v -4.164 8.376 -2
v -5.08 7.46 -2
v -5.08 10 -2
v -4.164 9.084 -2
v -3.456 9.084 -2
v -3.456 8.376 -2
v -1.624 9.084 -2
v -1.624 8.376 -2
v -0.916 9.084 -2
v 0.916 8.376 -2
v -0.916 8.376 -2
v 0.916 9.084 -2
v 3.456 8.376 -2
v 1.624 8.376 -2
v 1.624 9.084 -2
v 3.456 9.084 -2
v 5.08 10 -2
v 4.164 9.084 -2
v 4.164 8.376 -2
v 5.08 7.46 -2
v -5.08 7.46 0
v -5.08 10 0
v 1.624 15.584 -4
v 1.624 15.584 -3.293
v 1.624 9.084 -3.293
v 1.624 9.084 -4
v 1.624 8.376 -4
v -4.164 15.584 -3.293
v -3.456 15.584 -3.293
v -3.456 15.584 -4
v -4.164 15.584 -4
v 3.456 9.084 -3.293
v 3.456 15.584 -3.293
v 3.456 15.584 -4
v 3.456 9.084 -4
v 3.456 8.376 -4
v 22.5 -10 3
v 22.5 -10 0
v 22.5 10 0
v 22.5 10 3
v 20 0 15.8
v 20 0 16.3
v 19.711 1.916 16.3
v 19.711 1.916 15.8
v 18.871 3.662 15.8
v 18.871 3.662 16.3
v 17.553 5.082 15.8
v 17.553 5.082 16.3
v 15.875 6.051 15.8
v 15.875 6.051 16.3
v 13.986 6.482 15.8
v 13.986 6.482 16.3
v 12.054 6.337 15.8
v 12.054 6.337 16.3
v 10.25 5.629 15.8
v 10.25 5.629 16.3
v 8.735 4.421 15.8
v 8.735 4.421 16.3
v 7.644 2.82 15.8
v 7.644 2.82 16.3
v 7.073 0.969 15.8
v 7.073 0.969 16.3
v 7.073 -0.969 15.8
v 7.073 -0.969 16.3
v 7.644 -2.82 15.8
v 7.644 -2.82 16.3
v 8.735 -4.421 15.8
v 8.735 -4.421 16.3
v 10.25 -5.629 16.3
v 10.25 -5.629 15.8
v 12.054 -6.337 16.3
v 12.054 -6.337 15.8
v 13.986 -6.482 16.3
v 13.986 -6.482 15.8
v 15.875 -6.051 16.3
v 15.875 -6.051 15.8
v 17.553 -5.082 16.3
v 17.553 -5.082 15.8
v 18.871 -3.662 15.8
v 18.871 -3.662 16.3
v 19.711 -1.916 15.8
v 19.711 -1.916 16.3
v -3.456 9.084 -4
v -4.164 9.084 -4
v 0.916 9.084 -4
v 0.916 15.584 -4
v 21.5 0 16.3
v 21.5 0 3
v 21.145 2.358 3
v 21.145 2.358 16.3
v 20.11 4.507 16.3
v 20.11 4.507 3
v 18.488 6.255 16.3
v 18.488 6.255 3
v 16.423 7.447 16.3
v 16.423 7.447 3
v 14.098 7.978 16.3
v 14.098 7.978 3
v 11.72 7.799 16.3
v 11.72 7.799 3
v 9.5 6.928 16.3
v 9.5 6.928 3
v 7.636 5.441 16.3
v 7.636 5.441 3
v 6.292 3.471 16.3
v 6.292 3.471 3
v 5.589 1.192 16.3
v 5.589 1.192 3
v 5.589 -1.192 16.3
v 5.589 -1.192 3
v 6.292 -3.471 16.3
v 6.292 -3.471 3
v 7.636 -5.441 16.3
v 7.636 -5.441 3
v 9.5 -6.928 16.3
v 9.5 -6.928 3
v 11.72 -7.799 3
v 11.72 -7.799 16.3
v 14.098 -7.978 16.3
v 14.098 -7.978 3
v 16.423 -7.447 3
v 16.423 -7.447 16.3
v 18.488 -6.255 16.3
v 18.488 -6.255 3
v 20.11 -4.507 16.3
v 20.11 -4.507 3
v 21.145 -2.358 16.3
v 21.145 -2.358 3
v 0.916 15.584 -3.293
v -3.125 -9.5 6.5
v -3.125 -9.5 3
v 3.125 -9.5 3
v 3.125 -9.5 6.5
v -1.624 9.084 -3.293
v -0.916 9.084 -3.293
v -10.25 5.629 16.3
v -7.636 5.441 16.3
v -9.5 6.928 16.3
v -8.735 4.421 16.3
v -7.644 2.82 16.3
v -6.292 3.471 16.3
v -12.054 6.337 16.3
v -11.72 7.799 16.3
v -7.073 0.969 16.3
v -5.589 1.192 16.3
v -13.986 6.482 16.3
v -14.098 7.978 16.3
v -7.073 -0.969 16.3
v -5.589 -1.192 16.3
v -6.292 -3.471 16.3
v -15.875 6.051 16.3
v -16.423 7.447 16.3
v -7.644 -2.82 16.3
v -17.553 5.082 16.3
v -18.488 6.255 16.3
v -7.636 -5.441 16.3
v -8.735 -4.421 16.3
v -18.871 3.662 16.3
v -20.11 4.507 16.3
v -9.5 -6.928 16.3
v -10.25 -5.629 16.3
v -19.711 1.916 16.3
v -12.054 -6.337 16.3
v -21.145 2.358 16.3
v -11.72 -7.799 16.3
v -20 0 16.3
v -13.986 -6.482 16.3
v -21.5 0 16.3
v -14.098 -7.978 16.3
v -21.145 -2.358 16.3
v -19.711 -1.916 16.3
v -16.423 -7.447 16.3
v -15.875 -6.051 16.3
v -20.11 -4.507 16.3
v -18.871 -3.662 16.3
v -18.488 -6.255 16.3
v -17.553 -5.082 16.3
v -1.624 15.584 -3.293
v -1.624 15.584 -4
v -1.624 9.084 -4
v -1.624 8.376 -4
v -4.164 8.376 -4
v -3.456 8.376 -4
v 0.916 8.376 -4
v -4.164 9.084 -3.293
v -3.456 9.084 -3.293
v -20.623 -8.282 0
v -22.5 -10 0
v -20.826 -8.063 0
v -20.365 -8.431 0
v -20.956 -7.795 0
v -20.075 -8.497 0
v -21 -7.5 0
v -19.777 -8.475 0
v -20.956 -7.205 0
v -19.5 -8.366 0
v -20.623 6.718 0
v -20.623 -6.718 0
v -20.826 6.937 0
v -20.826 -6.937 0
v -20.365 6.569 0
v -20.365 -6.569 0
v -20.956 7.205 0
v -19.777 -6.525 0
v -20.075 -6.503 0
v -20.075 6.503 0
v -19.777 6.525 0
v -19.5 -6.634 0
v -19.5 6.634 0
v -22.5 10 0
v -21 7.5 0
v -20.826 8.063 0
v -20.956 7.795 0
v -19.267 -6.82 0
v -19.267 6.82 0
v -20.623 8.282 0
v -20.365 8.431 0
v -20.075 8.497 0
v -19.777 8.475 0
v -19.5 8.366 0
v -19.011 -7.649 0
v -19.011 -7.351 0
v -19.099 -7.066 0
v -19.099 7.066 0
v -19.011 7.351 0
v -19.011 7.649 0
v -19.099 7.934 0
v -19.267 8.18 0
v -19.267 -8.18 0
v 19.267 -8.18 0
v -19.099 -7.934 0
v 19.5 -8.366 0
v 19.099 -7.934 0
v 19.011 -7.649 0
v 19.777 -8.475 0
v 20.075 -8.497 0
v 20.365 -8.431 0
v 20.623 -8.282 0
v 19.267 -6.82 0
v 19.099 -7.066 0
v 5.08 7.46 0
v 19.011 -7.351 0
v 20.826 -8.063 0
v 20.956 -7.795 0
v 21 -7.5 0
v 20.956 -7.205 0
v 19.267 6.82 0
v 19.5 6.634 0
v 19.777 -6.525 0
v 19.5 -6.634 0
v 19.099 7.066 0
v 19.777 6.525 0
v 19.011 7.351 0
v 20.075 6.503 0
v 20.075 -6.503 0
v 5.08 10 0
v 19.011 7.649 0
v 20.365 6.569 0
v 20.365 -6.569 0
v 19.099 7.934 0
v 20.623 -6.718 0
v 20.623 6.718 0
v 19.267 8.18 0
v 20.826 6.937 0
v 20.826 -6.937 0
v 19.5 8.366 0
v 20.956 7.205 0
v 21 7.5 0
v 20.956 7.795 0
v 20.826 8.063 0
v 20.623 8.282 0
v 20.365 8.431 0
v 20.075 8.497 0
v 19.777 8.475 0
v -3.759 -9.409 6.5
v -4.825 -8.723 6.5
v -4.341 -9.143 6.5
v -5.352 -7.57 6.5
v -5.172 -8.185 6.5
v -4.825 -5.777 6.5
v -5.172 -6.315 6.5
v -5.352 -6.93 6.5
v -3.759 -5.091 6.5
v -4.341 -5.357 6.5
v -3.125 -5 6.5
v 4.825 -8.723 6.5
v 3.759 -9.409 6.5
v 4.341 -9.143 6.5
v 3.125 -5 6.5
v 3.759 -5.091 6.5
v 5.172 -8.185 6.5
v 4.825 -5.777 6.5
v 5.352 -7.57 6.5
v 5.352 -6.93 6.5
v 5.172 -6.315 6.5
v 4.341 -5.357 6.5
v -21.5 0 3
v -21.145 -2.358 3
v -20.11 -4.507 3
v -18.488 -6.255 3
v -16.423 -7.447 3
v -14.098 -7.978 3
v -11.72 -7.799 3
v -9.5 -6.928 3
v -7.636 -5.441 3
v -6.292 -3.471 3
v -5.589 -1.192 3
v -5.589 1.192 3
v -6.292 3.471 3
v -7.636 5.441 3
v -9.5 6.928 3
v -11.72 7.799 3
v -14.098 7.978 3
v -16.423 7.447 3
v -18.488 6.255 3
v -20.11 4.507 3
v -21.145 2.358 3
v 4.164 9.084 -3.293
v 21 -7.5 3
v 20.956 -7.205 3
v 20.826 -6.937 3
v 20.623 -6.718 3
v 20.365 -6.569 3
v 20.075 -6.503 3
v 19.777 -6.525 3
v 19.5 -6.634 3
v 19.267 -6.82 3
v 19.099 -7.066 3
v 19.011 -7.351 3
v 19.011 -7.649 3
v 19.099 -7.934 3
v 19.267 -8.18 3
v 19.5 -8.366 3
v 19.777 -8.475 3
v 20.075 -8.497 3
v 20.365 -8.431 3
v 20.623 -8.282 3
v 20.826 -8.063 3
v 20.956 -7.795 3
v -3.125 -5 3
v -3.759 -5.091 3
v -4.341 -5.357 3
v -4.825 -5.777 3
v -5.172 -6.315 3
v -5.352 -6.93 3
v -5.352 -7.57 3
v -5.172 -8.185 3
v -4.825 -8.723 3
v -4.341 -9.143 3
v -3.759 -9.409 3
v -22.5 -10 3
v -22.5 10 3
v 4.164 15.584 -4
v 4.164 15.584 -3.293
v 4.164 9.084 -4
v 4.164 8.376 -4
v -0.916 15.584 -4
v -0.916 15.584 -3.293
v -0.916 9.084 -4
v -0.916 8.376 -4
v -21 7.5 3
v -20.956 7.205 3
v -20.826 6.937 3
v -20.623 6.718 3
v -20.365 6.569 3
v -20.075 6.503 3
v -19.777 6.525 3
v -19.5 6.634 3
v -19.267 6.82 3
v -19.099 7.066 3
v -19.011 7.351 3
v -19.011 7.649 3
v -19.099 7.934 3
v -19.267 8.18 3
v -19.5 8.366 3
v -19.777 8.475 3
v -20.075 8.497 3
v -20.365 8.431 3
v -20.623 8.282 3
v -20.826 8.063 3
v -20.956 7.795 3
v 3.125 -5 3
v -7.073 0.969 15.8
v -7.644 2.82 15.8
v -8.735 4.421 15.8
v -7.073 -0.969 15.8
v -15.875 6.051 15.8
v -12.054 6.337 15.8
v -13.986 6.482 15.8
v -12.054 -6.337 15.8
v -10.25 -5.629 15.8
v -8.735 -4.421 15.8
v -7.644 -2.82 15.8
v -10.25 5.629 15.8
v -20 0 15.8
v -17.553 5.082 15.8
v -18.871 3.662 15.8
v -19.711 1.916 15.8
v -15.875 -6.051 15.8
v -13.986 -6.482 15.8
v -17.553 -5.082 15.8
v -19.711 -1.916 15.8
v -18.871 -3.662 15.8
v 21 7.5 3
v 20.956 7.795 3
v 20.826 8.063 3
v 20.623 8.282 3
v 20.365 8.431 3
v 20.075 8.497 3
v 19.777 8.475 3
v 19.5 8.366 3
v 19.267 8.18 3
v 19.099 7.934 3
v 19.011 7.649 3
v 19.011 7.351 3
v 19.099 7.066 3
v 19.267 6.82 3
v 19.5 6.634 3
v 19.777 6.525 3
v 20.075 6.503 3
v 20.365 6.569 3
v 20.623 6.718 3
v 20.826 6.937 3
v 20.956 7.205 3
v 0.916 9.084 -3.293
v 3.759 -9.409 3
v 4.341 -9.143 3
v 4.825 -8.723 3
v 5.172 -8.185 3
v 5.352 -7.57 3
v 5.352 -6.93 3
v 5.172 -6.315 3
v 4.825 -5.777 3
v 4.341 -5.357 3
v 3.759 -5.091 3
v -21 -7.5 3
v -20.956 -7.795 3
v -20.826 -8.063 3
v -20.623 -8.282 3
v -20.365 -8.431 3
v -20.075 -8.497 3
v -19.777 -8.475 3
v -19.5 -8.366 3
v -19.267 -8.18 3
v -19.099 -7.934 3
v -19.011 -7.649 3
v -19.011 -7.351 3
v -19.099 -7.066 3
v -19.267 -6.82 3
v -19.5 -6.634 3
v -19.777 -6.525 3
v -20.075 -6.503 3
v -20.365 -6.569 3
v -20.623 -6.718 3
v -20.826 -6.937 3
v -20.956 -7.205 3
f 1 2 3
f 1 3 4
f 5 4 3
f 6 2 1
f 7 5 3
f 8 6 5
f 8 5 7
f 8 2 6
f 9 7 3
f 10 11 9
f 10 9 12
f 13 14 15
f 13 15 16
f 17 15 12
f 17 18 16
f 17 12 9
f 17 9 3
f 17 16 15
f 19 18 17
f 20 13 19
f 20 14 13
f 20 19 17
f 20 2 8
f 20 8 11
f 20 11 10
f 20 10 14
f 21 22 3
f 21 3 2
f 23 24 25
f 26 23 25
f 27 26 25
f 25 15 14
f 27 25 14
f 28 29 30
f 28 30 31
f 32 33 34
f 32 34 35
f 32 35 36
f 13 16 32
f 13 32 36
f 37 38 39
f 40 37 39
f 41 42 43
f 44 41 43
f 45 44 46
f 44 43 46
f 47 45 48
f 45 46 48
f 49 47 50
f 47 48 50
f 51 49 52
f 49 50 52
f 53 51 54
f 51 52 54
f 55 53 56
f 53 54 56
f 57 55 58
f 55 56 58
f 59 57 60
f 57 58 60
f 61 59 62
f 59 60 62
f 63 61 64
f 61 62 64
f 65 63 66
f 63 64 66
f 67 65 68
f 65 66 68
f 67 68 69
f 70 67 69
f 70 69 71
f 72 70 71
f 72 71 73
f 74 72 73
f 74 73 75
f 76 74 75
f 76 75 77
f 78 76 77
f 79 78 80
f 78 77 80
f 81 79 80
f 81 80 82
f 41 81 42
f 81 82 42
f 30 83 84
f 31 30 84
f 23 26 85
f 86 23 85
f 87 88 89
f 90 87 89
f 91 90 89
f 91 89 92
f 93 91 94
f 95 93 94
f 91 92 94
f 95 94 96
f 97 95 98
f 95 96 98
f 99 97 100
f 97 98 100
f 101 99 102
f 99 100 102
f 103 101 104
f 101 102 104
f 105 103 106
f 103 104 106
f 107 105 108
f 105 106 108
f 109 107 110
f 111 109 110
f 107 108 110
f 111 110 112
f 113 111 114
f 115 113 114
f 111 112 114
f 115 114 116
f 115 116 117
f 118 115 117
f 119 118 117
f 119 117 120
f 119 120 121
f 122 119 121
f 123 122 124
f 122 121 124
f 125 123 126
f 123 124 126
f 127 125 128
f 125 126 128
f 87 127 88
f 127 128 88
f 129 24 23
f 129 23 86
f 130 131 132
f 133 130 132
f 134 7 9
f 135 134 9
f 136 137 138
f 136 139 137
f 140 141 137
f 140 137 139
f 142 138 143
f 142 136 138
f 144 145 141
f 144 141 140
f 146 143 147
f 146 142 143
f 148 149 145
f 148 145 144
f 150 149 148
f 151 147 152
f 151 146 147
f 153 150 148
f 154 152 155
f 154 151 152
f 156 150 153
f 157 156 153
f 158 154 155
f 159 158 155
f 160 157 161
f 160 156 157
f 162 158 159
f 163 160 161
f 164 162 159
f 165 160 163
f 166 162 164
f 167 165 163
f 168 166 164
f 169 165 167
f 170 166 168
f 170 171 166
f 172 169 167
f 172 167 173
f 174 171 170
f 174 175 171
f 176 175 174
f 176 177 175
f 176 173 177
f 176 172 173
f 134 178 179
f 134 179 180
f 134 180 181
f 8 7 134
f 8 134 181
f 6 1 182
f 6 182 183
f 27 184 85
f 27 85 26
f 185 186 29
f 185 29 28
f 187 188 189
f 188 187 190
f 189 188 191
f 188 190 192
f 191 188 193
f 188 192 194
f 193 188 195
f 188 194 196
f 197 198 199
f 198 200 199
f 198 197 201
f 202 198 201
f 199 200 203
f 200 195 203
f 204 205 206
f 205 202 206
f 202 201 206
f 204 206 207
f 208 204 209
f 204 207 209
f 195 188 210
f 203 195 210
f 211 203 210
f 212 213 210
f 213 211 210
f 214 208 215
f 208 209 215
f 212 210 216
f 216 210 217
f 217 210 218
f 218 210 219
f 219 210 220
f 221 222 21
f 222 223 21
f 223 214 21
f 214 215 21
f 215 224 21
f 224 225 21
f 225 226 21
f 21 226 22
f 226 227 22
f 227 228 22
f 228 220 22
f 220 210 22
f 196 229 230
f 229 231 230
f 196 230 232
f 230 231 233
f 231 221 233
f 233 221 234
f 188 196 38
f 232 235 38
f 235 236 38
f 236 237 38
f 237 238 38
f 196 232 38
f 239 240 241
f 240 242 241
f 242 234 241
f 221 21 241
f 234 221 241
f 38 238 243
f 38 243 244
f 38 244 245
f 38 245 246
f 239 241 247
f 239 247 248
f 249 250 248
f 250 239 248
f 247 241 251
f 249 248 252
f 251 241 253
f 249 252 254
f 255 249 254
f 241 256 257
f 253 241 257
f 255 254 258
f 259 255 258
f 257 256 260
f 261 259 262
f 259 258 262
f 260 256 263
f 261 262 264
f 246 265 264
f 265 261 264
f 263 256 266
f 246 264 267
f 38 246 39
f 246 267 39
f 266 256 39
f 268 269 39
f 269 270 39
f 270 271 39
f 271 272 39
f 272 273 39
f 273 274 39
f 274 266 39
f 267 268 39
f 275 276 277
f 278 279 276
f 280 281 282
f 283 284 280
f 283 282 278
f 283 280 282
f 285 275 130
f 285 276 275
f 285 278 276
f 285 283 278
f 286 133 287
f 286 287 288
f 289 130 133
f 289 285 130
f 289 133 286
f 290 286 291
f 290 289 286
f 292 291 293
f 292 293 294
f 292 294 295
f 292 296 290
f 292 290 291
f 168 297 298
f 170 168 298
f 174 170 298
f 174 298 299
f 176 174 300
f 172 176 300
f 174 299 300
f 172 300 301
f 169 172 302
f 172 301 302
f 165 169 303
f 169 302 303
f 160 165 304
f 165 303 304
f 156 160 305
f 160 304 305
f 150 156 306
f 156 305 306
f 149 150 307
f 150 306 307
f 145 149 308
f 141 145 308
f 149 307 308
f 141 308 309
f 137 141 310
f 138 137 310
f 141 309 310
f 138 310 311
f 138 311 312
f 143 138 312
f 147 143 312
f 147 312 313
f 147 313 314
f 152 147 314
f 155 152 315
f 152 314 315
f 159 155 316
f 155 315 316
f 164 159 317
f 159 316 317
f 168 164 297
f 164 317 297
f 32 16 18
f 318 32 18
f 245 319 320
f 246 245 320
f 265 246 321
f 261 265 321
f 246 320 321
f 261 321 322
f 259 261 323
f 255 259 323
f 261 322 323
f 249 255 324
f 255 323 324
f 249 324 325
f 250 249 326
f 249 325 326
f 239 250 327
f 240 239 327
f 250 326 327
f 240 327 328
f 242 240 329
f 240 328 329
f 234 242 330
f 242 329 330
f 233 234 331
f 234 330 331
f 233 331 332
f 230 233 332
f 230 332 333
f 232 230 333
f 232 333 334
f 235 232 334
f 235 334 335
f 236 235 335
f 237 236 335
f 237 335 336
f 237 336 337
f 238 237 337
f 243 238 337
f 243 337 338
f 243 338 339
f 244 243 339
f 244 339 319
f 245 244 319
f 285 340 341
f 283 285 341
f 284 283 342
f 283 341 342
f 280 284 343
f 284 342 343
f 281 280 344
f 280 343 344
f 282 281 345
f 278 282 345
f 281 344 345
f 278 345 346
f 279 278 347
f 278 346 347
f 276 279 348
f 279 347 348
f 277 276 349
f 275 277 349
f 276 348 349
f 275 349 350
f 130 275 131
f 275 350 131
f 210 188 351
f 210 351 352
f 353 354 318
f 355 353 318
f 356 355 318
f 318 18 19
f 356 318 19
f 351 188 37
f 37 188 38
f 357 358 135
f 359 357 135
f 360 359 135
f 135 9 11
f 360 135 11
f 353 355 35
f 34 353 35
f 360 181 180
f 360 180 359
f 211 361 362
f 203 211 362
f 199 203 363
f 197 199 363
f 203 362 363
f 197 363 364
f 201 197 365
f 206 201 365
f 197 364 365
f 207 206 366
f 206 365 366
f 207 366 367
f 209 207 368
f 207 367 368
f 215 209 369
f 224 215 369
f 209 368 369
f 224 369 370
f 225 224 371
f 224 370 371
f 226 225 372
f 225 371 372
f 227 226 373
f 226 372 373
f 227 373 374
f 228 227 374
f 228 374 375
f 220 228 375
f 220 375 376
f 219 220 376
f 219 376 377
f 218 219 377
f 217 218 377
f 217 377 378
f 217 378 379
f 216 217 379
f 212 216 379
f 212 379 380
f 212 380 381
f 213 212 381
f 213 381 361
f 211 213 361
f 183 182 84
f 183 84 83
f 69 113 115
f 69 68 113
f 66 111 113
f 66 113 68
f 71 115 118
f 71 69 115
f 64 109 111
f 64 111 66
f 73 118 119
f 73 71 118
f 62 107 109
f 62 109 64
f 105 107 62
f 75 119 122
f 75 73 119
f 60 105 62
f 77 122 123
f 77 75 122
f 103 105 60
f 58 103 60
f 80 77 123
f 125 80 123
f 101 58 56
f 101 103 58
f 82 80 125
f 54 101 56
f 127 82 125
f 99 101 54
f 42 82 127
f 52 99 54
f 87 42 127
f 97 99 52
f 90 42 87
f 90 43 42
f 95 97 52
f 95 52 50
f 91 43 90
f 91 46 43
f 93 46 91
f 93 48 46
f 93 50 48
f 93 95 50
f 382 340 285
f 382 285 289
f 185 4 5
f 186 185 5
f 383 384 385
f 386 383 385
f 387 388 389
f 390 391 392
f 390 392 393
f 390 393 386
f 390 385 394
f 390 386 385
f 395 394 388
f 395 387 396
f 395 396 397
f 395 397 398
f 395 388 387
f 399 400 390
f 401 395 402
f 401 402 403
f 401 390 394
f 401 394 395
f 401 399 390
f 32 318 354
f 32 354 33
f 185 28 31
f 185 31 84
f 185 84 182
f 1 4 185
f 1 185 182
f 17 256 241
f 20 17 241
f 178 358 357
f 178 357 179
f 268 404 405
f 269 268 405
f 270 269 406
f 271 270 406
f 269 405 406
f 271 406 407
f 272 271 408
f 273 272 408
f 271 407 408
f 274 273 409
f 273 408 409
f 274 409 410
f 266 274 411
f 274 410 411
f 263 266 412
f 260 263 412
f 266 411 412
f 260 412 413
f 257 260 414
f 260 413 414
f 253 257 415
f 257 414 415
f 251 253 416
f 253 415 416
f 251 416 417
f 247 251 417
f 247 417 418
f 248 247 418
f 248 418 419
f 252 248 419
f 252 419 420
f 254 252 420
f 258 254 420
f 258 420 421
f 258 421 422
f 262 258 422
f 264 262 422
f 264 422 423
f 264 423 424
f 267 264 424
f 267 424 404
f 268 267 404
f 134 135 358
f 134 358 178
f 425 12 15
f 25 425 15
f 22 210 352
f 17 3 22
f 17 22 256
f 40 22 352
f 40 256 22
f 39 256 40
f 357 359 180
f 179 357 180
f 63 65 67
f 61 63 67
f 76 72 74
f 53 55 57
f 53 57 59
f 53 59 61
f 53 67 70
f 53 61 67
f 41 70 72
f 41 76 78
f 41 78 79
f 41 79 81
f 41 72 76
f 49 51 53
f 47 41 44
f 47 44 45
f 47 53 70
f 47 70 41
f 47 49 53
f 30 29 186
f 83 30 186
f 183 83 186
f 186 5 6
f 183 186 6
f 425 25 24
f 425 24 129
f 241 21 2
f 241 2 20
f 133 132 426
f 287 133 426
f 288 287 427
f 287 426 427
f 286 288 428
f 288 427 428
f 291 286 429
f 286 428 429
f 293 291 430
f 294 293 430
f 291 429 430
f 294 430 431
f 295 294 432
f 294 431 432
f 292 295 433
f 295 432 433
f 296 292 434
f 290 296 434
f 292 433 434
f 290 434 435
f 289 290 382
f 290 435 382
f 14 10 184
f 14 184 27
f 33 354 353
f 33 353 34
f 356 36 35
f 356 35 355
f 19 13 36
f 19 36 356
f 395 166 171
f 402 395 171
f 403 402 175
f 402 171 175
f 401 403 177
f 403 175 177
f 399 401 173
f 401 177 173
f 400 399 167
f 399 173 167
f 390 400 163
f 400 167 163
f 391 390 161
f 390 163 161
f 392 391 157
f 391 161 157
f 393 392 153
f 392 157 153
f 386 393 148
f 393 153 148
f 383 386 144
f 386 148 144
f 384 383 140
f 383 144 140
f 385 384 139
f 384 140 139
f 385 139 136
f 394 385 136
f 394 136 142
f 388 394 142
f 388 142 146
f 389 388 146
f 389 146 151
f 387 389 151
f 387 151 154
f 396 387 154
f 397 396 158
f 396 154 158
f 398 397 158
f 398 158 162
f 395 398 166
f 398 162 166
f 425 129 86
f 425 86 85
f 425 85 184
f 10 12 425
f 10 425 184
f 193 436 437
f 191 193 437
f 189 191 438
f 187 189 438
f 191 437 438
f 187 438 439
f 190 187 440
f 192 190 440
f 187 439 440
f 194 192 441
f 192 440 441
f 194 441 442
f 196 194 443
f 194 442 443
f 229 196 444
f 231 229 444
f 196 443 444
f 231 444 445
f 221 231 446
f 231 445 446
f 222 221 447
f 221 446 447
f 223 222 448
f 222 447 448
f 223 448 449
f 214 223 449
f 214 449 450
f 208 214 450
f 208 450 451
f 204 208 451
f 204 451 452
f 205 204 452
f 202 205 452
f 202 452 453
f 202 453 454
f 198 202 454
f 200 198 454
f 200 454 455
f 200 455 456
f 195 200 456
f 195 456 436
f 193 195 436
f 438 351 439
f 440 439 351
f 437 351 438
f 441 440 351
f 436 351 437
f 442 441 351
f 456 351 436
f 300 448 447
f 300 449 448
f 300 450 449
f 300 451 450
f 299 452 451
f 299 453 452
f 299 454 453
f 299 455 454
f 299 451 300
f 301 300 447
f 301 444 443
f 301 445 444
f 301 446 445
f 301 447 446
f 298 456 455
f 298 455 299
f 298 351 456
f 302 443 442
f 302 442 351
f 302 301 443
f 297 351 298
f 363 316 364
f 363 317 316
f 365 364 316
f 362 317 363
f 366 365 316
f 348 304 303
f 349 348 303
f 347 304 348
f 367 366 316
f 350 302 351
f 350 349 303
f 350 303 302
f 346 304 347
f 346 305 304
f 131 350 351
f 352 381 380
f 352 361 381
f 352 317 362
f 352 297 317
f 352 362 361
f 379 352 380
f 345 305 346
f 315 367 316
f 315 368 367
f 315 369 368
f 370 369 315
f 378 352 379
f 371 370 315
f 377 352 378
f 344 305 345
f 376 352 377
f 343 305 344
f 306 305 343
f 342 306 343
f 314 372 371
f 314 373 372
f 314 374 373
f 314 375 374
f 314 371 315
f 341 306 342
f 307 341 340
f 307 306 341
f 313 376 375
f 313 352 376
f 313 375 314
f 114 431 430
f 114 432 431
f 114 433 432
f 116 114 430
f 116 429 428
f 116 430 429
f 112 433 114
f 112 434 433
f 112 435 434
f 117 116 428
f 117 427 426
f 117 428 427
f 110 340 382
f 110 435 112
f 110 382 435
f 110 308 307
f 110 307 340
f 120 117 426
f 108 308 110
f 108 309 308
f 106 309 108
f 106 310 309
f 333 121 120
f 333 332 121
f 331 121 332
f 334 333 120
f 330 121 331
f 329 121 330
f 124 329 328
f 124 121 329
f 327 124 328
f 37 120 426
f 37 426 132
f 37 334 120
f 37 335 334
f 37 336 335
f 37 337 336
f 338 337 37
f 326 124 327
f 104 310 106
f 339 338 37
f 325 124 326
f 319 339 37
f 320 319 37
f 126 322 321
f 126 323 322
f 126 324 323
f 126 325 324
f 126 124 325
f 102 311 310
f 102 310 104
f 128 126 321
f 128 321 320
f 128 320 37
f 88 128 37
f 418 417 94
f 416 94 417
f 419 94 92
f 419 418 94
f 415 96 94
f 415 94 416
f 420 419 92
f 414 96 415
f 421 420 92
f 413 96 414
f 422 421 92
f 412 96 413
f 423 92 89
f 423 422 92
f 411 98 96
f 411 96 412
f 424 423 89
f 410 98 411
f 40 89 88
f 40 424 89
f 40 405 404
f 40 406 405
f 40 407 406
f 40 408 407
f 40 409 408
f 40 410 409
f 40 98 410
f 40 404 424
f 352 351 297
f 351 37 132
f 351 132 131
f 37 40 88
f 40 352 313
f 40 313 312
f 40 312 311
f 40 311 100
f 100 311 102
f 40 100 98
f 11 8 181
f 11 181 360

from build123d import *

# Parameters (mm, degrees)
SKETCH_W               = 45
SKETCH_H               = 20
PAD_DEPTH              = 3
SKETCH001_R            = 1
POCKET_DEPTH           = 5
POLARPATTERN_COUNT     = 2
SKETCH002_R            = 8
PAD001_DEPTH           = 13.3
POLARPATTERN001_COUNT  = 2
PAD002_DEPTH           = 3.5
SKETCH006_W            = 10.16
SKETCH006_H            = 2.54
PAD003_DEPTH           = 2
SKETCH007_W            = 0.707106
SKETCH007_H            = 0.707106
PAD004_DEPTH           = 2
LINEARPATTERN_COUNT    = 4
LINEARPATTERN_PITCH    = 2.54
SKETCH008_W            = 0.707106
SKETCH008_H            = 0.707107
PAD005_DEPTH           = 6.5
LINEARPATTERN001_COUNT = 4
LINEARPATTERN001_PITCH = 2.54
SKETCH009_R            = 1
POCKET001_DEPTH        = 5
POLARPATTERN002_COUNT  = 2
SKETCH010_R            = 6.5
POCKET002_DEPTH        = 0.5
POLARPATTERN003_COUNT  = 2


with BuildPart() as part:
    # Sketch → Pad (new body)
    with BuildSketch(Plane.XY):
        Rectangle(SKETCH_W, SKETCH_H)
    extrude(amount=PAD_DEPTH)

    # Sketch001 (on Face6 of Pad) → Pocket (cut)
    with BuildSketch(Plane.XY.offset(3)):
        with Locations((20, 7.5)):
            Circle(SKETCH001_R)
    pocket = extrude(amount=-POCKET_DEPTH, mode=Mode.SUBTRACT)

    # PolarPattern: Pocket ×2 about axis
    polarpattern_axis = Axis((0, 0, 3), (0, 0, 1))
    for i in range(1, POLARPATTERN_COUNT):
        add(pocket.rotate(polarpattern_axis, i * 360 / POLARPATTERN_COUNT), mode=Mode.SUBTRACT)

    # Sketch002 (on Face5 of PolarPattern) → Pad001 (join)
    with BuildSketch(Plane.XY.offset(3)):
        with Locations((13.5, 0)):
            Circle(SKETCH002_R)
    pad001 = extrude(amount=PAD001_DEPTH)

    # PolarPattern001: Pad001 ×2 about axis
    polarpattern001_axis = Axis((0, 0, 3), (0, 0, 1))
    for i in range(1, POLARPATTERN001_COUNT):
        add(pad001.rotate(polarpattern001_axis, i * 360 / POLARPATTERN001_COUNT))

    # Sketch003 (on Face5 of PolarPattern001) → Pad002 (join)
    with BuildSketch(Plane.XY.offset(3)):
        with BuildLine():
            ThreePointArc((-3.125, -5), (-5.375, -7.25), (-3.125, -9.5))
            Line((-3.125, -9.5), (3.125, -9.5))
            ThreePointArc((3.125, -9.5), (5.375, -7.25), (3.125, -5))
            Line((-3.125, -5), (3.125, -5))
        make_face()
    extrude(amount=PAD002_DEPTH)

    # Sketch006 (on Face4 of Pad002) → Pad003 (join)
    with BuildSketch(Plane(origin=(0, 0, 0), x_dir=(1, 0, 0), z_dir=(0, 0, -1))):
        with Locations((0, -8.73)):
            Rectangle(SKETCH006_W, SKETCH006_H)
    extrude(amount=PAD003_DEPTH)

    # Sketch007 (on Face13 of Pad003) → Pad004 (join)
    with BuildSketch(Plane(origin=(0, 0, -2), x_dir=(1, 0, 0), z_dir=(0, 0, -1))):
        with Locations((-3.81, -8.73)):
            Rectangle(SKETCH007_W, SKETCH007_H)
    pad004 = extrude(amount=PAD004_DEPTH)

    # LinearPattern: Pad004 ×4
    with Locations(*[(i * LINEARPATTERN_PITCH, 0, 0) for i in range(1, LINEARPATTERN_COUNT)]):
        add(pad004)

    # Sketch008 (on Face31 of LinearPattern) → Pad005 (join)
    with BuildSketch(Plane(origin=(0, 9.083553, 0), x_dir=(-1, 0, 0), z_dir=(0, 1, 0))):
        with Locations((-3.81, -3.646443)):
            Rectangle(SKETCH008_W, SKETCH008_H)
    pad005 = extrude(amount=PAD005_DEPTH)

    # LinearPattern001: Pad005 ×4
    with Locations(*[(-i * LINEARPATTERN001_PITCH, 0, 0) for i in range(1, LINEARPATTERN001_COUNT)]):
        add(pad005)

    # Sketch009 → Pocket001 (cut)
    with BuildSketch(Plane.XY.offset(3)):
        with Locations((20, -7.5)):
            Circle(SKETCH009_R)
    pocket001 = extrude(amount=-POCKET001_DEPTH, mode=Mode.SUBTRACT)

    # PolarPattern002: Pocket001 ×2 about axis
    polarpattern002_axis = Axis((0, 0, 3), (0, 0, 1))
    for i in range(1, POLARPATTERN002_COUNT):
        add(pocket001.rotate(polarpattern002_axis, i * 360 / POLARPATTERN002_COUNT), mode=Mode.SUBTRACT)

    # Sketch010 (on Face76 of PolarPattern002) → Pocket002 (cut)
    with BuildSketch(Plane.XY.offset(16.3)):
        with Locations((13.5, 0)):
            Circle(SKETCH010_R)
    pocket002 = extrude(amount=-POCKET002_DEPTH, mode=Mode.SUBTRACT)

    # PolarPattern003: Pocket002 ×2 about axis
    polarpattern003_axis = Axis((0, 0, 16.3), (0, 0, 1))
    for i in range(1, POLARPATTERN003_COUNT):
        add(pocket002.rotate(polarpattern003_axis, i * 360 / POLARPATTERN003_COUNT), mode=Mode.SUBTRACT)


solid = part.part
